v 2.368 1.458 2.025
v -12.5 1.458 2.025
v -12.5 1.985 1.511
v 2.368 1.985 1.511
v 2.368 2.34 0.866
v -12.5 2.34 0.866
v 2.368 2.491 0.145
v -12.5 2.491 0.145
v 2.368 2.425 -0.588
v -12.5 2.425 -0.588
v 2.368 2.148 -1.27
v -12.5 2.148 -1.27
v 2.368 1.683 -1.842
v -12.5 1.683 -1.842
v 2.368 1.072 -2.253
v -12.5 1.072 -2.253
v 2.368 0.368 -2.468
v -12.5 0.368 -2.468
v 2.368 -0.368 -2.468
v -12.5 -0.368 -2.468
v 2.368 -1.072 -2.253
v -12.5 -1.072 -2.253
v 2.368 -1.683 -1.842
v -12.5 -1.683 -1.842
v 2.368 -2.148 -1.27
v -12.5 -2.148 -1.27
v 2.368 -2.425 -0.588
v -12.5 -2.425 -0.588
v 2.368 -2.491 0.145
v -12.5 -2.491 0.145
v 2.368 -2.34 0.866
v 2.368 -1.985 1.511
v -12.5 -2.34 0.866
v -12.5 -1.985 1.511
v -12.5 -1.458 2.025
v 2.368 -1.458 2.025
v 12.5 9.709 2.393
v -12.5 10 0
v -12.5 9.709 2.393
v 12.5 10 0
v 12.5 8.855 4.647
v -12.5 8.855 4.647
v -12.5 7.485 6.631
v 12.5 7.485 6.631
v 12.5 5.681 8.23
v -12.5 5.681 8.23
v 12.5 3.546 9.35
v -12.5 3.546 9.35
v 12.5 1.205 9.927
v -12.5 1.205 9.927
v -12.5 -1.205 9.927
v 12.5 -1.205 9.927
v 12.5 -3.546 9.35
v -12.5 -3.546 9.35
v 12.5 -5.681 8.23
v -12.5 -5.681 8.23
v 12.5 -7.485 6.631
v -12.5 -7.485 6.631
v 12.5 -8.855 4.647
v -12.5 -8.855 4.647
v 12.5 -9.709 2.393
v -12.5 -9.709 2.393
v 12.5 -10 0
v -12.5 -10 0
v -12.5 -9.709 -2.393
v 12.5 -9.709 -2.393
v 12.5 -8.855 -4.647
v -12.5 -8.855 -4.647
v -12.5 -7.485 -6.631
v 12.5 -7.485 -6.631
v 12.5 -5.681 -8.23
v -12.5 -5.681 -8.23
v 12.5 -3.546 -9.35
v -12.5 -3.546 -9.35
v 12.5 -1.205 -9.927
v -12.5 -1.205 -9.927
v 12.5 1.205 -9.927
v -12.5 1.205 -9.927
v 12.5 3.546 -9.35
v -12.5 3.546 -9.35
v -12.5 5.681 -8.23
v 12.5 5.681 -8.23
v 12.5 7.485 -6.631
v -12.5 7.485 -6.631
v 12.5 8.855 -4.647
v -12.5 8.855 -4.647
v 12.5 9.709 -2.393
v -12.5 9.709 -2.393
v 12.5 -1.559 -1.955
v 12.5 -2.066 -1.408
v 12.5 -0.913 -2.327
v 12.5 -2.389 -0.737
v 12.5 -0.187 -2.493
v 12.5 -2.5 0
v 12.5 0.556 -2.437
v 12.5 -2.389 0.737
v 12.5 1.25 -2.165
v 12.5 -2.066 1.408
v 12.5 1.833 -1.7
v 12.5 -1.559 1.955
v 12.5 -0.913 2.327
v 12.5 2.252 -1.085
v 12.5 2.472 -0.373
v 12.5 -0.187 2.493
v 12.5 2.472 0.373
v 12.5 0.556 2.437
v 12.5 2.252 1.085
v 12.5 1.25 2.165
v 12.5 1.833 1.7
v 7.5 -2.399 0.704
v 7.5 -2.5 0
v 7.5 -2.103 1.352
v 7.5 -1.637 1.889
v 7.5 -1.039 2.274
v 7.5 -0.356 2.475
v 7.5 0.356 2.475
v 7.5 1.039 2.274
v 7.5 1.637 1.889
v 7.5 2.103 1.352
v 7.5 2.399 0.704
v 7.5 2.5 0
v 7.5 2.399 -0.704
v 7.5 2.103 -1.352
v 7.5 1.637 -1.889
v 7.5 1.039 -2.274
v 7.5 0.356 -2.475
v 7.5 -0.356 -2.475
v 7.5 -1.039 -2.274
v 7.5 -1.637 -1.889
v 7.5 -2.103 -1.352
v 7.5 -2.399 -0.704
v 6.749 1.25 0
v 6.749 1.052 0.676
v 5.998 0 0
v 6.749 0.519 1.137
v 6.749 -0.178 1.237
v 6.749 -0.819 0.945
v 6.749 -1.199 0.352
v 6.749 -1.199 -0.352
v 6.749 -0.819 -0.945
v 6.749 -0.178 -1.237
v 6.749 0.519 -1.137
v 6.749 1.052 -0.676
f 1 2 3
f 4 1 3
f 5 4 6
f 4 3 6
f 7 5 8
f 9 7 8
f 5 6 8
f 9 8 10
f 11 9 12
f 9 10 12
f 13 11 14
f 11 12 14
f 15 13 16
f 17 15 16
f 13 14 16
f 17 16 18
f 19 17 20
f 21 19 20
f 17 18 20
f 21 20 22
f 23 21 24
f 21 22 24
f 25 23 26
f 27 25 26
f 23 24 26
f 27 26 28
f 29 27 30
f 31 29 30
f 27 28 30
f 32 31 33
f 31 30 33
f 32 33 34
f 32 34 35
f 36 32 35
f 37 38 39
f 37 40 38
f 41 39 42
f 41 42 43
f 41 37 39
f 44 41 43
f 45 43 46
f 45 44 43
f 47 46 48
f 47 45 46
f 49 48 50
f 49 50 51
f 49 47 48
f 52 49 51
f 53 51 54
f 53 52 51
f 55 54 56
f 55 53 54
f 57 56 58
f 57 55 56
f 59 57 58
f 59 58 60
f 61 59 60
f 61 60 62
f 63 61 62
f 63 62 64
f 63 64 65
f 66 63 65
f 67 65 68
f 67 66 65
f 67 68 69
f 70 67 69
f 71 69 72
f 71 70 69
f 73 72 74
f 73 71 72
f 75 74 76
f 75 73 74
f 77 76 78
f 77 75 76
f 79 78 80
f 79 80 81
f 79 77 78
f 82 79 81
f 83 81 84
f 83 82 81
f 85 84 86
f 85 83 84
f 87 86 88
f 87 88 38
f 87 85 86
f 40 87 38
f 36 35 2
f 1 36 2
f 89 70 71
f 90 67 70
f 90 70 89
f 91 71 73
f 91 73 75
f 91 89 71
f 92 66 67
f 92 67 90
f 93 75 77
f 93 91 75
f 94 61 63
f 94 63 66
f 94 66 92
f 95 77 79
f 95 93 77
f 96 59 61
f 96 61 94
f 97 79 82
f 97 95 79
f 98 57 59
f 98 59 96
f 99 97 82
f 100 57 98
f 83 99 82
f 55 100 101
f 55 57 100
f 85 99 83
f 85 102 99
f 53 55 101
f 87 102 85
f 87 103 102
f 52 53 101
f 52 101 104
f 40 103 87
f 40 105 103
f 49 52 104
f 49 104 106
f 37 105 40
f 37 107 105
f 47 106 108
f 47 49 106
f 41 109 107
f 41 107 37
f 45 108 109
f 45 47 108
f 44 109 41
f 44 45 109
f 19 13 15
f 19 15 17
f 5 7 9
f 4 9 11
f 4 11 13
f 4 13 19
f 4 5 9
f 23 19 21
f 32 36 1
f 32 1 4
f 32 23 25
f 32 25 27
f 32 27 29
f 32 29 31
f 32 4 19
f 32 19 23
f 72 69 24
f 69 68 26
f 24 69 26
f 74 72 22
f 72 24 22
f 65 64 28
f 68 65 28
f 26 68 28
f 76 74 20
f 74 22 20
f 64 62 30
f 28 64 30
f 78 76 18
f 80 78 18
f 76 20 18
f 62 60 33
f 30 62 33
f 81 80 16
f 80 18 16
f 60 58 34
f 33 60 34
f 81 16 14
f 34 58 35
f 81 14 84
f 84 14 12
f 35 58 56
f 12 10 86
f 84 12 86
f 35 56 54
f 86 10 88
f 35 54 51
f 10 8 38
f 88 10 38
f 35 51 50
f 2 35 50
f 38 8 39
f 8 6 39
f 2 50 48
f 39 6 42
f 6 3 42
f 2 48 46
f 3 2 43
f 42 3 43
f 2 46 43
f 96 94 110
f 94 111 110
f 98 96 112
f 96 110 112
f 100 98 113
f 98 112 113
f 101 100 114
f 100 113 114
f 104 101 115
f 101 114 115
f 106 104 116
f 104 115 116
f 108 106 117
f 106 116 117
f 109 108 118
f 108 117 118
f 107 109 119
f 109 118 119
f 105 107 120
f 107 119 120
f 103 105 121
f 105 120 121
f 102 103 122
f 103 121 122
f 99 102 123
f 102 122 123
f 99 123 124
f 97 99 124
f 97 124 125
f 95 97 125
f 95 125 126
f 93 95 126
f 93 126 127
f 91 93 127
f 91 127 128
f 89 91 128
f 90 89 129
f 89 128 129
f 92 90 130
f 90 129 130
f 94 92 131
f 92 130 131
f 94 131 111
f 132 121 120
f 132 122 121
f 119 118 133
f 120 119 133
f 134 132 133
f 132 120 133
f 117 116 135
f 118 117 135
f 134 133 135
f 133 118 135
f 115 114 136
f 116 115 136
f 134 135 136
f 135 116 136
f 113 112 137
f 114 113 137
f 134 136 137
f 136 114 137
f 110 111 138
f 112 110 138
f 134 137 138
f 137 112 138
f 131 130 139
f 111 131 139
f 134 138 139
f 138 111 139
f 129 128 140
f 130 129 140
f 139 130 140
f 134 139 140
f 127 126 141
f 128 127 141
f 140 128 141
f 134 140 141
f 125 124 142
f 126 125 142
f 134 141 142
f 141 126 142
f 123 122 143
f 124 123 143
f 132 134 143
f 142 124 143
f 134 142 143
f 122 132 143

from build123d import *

# Parameters (mm, degrees)
F0_R     = 10
F0_R_2   = 2.5
F2_DEPTH = 12.5
F3_D     = 5
F3_DEPTH = 5
F3_TIP   = 1.5021515476
F5_DEPTH = 14.868


with BuildPart() as f2:
    # F0 (on Right) → F2 (new body, symmetric)
    with BuildSketch(Plane.YZ):
        Circle(F0_R)
        Circle(F0_R_2, mode=Mode.SUBTRACT)
        Circle(F0_R_2)
    extrude(amount=F2_DEPTH, both=True)

    # F3
    with Locations(Plane.YZ.offset(12.5)):
        with Locations((0, 0)):
            Hole(F3_D / 2, depth=F3_DEPTH)
            with Locations((0, 0, -(F3_DEPTH + F3_TIP / 2))):  # 118° drill point
                Cone(0, F3_D / 2, F3_TIP, mode=Mode.SUBTRACT)

    # F4 (on face) → F5 (cut)
    with BuildSketch(Plane(origin=(-12.5, 0, 0), x_dir=(0, -1, 0), z_dir=(-1, 0, 0))):
        with BuildLine():
            Line((1.4575, 2.025023148), (-1.4575, 2.025023148))
            ThreePointArc((-1.4575, 2.025023148), (0, -2.495), (1.4575, 2.025023148))
        make_face()
    extrude(amount=-F5_DEPTH, mode=Mode.SUBTRACT)


solid = f2.part
